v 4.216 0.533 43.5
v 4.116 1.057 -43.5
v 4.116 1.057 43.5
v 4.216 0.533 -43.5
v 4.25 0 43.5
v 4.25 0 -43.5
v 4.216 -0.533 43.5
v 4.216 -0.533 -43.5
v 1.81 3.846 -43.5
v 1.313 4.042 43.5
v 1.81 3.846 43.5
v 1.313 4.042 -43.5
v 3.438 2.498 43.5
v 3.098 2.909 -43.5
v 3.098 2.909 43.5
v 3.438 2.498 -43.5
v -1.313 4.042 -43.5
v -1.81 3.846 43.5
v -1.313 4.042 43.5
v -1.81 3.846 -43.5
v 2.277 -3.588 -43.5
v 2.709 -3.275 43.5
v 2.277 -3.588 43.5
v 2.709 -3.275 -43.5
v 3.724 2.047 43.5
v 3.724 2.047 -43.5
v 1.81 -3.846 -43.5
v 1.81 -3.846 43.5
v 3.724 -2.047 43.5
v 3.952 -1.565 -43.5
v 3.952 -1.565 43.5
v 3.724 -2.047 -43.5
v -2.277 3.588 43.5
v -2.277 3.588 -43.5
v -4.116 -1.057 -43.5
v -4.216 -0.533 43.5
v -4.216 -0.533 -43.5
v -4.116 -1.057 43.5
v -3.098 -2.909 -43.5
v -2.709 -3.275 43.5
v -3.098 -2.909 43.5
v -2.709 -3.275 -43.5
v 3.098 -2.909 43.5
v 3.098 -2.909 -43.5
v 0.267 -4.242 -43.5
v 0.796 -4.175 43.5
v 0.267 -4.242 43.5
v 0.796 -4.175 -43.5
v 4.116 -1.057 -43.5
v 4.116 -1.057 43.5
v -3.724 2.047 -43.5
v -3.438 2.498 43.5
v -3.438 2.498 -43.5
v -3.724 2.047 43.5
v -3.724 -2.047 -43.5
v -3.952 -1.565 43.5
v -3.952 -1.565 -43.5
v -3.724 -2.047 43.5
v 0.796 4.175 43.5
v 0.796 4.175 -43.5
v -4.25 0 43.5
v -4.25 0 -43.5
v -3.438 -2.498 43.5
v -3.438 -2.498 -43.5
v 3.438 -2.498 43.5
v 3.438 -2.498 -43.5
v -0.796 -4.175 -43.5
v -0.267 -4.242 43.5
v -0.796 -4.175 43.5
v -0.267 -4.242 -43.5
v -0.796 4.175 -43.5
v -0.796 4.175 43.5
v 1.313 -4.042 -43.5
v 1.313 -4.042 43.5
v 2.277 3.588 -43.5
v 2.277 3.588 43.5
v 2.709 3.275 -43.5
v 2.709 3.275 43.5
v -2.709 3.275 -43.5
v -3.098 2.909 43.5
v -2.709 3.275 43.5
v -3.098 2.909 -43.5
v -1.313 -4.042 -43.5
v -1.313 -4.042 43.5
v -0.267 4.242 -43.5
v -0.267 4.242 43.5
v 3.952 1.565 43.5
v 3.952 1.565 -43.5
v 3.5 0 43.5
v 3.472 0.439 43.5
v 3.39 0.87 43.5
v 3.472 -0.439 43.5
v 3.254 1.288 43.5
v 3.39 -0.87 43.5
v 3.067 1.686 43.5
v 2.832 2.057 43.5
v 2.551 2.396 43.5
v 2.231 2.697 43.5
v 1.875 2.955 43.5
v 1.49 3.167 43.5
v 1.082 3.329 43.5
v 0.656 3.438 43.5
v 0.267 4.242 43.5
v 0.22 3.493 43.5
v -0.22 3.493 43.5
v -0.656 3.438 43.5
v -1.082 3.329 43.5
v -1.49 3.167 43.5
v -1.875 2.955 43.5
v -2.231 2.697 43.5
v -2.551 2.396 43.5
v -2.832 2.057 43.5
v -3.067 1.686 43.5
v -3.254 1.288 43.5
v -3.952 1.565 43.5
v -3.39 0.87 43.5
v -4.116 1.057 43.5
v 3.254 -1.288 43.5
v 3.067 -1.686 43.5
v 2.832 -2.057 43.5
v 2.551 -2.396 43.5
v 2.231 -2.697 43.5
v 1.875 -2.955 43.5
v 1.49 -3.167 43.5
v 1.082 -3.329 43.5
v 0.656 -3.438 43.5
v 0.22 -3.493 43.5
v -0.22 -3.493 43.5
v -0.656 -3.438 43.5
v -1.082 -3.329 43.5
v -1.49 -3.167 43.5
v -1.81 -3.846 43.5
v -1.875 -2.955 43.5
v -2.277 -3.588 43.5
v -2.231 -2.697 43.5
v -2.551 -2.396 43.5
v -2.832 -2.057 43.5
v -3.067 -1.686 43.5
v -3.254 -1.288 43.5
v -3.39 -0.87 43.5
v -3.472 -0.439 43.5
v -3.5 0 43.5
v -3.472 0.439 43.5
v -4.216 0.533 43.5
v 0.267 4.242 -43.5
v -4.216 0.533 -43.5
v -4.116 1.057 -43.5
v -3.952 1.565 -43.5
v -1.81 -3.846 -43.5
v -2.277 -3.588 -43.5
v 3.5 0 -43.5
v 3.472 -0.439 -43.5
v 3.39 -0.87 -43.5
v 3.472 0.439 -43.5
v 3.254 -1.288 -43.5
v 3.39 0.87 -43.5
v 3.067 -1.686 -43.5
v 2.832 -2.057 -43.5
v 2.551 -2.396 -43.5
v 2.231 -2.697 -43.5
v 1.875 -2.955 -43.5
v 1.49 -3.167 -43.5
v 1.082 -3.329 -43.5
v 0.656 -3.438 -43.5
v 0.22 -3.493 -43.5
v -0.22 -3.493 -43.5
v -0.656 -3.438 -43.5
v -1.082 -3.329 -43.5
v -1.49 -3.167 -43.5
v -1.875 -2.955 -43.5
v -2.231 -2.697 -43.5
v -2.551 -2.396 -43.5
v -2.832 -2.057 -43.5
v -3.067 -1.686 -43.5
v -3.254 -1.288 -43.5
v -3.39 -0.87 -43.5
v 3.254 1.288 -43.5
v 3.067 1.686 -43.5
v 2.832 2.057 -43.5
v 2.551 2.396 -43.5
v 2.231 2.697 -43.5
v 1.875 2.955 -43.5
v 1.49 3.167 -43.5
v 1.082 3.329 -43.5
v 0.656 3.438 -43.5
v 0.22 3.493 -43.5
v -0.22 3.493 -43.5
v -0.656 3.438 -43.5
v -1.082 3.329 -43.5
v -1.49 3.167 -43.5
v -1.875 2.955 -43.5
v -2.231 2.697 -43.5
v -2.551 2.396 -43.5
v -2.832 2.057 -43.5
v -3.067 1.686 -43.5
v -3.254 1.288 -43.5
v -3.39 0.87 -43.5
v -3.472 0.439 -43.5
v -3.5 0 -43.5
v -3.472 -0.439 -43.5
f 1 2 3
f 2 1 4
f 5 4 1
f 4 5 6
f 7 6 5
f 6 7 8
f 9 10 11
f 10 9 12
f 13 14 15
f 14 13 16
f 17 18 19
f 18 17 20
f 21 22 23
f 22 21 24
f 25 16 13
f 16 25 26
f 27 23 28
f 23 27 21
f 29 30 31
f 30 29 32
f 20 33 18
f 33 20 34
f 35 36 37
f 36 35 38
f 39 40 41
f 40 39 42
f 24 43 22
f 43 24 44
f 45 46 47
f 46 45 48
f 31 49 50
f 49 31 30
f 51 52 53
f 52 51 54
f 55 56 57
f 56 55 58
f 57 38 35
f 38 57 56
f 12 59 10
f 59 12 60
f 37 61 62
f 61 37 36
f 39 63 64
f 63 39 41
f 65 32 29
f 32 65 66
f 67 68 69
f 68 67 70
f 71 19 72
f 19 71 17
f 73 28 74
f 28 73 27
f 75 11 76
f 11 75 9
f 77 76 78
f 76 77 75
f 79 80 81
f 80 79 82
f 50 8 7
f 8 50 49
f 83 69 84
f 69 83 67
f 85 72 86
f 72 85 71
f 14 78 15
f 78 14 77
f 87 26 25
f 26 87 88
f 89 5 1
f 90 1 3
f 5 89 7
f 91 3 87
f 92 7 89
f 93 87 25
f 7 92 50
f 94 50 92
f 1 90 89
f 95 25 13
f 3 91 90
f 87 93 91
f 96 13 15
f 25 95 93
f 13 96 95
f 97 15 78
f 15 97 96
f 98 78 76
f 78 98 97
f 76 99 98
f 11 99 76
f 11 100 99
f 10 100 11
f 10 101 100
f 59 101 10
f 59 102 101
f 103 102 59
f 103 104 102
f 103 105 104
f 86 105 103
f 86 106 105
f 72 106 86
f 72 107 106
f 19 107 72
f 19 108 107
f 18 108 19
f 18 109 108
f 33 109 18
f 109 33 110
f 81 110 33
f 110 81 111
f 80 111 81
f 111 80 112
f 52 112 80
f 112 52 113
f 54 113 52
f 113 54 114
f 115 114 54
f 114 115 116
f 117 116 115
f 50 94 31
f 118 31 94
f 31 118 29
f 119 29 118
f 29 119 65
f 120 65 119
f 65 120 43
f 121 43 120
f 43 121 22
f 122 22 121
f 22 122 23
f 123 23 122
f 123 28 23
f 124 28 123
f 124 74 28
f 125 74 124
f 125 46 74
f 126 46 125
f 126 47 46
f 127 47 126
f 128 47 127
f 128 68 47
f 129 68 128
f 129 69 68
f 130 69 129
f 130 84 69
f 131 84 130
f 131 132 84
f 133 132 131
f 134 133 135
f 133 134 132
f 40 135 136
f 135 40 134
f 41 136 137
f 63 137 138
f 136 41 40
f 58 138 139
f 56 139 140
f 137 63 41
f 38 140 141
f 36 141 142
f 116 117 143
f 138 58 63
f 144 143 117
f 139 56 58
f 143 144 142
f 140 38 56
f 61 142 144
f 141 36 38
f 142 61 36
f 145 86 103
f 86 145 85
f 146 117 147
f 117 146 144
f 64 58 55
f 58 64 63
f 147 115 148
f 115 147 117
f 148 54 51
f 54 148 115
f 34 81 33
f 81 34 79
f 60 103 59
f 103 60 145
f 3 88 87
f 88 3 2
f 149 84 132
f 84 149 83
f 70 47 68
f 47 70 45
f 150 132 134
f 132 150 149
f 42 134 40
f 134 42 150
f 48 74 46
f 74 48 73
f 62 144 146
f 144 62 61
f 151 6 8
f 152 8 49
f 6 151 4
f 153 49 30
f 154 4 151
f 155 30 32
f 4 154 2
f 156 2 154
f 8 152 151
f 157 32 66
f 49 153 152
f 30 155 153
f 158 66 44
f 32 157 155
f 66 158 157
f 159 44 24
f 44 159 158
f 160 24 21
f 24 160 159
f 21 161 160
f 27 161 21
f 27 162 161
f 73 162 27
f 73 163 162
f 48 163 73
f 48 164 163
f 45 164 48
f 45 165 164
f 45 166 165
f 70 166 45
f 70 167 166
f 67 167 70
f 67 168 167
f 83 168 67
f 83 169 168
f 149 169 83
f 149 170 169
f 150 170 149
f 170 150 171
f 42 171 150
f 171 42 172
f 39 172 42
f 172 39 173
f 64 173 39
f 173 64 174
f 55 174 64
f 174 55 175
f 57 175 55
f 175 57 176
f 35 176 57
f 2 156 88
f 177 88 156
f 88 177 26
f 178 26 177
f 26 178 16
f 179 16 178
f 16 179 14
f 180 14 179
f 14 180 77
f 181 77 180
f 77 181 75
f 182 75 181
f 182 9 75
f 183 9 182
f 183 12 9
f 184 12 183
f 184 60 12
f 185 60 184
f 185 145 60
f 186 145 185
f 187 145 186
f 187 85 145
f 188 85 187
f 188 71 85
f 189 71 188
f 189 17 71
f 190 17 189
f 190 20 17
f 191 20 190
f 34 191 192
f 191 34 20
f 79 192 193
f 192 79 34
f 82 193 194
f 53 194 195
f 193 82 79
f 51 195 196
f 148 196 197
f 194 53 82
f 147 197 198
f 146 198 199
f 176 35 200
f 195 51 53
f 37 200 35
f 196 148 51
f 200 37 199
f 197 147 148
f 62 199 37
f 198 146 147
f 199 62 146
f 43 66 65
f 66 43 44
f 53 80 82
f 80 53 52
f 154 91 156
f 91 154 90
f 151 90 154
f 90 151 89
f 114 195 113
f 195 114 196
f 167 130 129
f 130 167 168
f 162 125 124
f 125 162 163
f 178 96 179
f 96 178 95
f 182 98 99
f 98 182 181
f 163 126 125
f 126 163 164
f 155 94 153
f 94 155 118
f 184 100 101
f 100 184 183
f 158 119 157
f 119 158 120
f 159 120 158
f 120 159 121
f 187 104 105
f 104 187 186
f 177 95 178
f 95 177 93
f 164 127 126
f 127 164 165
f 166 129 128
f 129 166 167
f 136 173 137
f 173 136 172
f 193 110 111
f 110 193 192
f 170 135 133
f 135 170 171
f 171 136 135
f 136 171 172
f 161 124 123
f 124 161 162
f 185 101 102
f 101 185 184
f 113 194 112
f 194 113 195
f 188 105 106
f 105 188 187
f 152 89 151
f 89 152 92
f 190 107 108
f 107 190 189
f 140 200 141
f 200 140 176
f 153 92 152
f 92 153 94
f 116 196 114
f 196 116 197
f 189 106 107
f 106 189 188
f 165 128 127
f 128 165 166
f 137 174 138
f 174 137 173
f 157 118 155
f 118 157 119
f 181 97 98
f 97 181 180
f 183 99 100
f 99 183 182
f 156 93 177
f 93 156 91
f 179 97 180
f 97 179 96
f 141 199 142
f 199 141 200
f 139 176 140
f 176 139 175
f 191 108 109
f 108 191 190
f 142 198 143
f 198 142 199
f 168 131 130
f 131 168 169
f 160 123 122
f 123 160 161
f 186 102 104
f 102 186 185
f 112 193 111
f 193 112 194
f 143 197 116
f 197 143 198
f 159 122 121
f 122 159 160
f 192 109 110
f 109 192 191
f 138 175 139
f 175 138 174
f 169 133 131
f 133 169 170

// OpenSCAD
$fn = 50;


difference() {
	union() {
		translate(v = [0, 0, -43.5000000000]) {
			cylinder(h = 87, r = 4.2500000000);
		}
	}
	union() {
		translate(v = [0, 0, -100.0000000000]) {
			cylinder(h = 200, r = 3.5000000000);
		}
	}
}
